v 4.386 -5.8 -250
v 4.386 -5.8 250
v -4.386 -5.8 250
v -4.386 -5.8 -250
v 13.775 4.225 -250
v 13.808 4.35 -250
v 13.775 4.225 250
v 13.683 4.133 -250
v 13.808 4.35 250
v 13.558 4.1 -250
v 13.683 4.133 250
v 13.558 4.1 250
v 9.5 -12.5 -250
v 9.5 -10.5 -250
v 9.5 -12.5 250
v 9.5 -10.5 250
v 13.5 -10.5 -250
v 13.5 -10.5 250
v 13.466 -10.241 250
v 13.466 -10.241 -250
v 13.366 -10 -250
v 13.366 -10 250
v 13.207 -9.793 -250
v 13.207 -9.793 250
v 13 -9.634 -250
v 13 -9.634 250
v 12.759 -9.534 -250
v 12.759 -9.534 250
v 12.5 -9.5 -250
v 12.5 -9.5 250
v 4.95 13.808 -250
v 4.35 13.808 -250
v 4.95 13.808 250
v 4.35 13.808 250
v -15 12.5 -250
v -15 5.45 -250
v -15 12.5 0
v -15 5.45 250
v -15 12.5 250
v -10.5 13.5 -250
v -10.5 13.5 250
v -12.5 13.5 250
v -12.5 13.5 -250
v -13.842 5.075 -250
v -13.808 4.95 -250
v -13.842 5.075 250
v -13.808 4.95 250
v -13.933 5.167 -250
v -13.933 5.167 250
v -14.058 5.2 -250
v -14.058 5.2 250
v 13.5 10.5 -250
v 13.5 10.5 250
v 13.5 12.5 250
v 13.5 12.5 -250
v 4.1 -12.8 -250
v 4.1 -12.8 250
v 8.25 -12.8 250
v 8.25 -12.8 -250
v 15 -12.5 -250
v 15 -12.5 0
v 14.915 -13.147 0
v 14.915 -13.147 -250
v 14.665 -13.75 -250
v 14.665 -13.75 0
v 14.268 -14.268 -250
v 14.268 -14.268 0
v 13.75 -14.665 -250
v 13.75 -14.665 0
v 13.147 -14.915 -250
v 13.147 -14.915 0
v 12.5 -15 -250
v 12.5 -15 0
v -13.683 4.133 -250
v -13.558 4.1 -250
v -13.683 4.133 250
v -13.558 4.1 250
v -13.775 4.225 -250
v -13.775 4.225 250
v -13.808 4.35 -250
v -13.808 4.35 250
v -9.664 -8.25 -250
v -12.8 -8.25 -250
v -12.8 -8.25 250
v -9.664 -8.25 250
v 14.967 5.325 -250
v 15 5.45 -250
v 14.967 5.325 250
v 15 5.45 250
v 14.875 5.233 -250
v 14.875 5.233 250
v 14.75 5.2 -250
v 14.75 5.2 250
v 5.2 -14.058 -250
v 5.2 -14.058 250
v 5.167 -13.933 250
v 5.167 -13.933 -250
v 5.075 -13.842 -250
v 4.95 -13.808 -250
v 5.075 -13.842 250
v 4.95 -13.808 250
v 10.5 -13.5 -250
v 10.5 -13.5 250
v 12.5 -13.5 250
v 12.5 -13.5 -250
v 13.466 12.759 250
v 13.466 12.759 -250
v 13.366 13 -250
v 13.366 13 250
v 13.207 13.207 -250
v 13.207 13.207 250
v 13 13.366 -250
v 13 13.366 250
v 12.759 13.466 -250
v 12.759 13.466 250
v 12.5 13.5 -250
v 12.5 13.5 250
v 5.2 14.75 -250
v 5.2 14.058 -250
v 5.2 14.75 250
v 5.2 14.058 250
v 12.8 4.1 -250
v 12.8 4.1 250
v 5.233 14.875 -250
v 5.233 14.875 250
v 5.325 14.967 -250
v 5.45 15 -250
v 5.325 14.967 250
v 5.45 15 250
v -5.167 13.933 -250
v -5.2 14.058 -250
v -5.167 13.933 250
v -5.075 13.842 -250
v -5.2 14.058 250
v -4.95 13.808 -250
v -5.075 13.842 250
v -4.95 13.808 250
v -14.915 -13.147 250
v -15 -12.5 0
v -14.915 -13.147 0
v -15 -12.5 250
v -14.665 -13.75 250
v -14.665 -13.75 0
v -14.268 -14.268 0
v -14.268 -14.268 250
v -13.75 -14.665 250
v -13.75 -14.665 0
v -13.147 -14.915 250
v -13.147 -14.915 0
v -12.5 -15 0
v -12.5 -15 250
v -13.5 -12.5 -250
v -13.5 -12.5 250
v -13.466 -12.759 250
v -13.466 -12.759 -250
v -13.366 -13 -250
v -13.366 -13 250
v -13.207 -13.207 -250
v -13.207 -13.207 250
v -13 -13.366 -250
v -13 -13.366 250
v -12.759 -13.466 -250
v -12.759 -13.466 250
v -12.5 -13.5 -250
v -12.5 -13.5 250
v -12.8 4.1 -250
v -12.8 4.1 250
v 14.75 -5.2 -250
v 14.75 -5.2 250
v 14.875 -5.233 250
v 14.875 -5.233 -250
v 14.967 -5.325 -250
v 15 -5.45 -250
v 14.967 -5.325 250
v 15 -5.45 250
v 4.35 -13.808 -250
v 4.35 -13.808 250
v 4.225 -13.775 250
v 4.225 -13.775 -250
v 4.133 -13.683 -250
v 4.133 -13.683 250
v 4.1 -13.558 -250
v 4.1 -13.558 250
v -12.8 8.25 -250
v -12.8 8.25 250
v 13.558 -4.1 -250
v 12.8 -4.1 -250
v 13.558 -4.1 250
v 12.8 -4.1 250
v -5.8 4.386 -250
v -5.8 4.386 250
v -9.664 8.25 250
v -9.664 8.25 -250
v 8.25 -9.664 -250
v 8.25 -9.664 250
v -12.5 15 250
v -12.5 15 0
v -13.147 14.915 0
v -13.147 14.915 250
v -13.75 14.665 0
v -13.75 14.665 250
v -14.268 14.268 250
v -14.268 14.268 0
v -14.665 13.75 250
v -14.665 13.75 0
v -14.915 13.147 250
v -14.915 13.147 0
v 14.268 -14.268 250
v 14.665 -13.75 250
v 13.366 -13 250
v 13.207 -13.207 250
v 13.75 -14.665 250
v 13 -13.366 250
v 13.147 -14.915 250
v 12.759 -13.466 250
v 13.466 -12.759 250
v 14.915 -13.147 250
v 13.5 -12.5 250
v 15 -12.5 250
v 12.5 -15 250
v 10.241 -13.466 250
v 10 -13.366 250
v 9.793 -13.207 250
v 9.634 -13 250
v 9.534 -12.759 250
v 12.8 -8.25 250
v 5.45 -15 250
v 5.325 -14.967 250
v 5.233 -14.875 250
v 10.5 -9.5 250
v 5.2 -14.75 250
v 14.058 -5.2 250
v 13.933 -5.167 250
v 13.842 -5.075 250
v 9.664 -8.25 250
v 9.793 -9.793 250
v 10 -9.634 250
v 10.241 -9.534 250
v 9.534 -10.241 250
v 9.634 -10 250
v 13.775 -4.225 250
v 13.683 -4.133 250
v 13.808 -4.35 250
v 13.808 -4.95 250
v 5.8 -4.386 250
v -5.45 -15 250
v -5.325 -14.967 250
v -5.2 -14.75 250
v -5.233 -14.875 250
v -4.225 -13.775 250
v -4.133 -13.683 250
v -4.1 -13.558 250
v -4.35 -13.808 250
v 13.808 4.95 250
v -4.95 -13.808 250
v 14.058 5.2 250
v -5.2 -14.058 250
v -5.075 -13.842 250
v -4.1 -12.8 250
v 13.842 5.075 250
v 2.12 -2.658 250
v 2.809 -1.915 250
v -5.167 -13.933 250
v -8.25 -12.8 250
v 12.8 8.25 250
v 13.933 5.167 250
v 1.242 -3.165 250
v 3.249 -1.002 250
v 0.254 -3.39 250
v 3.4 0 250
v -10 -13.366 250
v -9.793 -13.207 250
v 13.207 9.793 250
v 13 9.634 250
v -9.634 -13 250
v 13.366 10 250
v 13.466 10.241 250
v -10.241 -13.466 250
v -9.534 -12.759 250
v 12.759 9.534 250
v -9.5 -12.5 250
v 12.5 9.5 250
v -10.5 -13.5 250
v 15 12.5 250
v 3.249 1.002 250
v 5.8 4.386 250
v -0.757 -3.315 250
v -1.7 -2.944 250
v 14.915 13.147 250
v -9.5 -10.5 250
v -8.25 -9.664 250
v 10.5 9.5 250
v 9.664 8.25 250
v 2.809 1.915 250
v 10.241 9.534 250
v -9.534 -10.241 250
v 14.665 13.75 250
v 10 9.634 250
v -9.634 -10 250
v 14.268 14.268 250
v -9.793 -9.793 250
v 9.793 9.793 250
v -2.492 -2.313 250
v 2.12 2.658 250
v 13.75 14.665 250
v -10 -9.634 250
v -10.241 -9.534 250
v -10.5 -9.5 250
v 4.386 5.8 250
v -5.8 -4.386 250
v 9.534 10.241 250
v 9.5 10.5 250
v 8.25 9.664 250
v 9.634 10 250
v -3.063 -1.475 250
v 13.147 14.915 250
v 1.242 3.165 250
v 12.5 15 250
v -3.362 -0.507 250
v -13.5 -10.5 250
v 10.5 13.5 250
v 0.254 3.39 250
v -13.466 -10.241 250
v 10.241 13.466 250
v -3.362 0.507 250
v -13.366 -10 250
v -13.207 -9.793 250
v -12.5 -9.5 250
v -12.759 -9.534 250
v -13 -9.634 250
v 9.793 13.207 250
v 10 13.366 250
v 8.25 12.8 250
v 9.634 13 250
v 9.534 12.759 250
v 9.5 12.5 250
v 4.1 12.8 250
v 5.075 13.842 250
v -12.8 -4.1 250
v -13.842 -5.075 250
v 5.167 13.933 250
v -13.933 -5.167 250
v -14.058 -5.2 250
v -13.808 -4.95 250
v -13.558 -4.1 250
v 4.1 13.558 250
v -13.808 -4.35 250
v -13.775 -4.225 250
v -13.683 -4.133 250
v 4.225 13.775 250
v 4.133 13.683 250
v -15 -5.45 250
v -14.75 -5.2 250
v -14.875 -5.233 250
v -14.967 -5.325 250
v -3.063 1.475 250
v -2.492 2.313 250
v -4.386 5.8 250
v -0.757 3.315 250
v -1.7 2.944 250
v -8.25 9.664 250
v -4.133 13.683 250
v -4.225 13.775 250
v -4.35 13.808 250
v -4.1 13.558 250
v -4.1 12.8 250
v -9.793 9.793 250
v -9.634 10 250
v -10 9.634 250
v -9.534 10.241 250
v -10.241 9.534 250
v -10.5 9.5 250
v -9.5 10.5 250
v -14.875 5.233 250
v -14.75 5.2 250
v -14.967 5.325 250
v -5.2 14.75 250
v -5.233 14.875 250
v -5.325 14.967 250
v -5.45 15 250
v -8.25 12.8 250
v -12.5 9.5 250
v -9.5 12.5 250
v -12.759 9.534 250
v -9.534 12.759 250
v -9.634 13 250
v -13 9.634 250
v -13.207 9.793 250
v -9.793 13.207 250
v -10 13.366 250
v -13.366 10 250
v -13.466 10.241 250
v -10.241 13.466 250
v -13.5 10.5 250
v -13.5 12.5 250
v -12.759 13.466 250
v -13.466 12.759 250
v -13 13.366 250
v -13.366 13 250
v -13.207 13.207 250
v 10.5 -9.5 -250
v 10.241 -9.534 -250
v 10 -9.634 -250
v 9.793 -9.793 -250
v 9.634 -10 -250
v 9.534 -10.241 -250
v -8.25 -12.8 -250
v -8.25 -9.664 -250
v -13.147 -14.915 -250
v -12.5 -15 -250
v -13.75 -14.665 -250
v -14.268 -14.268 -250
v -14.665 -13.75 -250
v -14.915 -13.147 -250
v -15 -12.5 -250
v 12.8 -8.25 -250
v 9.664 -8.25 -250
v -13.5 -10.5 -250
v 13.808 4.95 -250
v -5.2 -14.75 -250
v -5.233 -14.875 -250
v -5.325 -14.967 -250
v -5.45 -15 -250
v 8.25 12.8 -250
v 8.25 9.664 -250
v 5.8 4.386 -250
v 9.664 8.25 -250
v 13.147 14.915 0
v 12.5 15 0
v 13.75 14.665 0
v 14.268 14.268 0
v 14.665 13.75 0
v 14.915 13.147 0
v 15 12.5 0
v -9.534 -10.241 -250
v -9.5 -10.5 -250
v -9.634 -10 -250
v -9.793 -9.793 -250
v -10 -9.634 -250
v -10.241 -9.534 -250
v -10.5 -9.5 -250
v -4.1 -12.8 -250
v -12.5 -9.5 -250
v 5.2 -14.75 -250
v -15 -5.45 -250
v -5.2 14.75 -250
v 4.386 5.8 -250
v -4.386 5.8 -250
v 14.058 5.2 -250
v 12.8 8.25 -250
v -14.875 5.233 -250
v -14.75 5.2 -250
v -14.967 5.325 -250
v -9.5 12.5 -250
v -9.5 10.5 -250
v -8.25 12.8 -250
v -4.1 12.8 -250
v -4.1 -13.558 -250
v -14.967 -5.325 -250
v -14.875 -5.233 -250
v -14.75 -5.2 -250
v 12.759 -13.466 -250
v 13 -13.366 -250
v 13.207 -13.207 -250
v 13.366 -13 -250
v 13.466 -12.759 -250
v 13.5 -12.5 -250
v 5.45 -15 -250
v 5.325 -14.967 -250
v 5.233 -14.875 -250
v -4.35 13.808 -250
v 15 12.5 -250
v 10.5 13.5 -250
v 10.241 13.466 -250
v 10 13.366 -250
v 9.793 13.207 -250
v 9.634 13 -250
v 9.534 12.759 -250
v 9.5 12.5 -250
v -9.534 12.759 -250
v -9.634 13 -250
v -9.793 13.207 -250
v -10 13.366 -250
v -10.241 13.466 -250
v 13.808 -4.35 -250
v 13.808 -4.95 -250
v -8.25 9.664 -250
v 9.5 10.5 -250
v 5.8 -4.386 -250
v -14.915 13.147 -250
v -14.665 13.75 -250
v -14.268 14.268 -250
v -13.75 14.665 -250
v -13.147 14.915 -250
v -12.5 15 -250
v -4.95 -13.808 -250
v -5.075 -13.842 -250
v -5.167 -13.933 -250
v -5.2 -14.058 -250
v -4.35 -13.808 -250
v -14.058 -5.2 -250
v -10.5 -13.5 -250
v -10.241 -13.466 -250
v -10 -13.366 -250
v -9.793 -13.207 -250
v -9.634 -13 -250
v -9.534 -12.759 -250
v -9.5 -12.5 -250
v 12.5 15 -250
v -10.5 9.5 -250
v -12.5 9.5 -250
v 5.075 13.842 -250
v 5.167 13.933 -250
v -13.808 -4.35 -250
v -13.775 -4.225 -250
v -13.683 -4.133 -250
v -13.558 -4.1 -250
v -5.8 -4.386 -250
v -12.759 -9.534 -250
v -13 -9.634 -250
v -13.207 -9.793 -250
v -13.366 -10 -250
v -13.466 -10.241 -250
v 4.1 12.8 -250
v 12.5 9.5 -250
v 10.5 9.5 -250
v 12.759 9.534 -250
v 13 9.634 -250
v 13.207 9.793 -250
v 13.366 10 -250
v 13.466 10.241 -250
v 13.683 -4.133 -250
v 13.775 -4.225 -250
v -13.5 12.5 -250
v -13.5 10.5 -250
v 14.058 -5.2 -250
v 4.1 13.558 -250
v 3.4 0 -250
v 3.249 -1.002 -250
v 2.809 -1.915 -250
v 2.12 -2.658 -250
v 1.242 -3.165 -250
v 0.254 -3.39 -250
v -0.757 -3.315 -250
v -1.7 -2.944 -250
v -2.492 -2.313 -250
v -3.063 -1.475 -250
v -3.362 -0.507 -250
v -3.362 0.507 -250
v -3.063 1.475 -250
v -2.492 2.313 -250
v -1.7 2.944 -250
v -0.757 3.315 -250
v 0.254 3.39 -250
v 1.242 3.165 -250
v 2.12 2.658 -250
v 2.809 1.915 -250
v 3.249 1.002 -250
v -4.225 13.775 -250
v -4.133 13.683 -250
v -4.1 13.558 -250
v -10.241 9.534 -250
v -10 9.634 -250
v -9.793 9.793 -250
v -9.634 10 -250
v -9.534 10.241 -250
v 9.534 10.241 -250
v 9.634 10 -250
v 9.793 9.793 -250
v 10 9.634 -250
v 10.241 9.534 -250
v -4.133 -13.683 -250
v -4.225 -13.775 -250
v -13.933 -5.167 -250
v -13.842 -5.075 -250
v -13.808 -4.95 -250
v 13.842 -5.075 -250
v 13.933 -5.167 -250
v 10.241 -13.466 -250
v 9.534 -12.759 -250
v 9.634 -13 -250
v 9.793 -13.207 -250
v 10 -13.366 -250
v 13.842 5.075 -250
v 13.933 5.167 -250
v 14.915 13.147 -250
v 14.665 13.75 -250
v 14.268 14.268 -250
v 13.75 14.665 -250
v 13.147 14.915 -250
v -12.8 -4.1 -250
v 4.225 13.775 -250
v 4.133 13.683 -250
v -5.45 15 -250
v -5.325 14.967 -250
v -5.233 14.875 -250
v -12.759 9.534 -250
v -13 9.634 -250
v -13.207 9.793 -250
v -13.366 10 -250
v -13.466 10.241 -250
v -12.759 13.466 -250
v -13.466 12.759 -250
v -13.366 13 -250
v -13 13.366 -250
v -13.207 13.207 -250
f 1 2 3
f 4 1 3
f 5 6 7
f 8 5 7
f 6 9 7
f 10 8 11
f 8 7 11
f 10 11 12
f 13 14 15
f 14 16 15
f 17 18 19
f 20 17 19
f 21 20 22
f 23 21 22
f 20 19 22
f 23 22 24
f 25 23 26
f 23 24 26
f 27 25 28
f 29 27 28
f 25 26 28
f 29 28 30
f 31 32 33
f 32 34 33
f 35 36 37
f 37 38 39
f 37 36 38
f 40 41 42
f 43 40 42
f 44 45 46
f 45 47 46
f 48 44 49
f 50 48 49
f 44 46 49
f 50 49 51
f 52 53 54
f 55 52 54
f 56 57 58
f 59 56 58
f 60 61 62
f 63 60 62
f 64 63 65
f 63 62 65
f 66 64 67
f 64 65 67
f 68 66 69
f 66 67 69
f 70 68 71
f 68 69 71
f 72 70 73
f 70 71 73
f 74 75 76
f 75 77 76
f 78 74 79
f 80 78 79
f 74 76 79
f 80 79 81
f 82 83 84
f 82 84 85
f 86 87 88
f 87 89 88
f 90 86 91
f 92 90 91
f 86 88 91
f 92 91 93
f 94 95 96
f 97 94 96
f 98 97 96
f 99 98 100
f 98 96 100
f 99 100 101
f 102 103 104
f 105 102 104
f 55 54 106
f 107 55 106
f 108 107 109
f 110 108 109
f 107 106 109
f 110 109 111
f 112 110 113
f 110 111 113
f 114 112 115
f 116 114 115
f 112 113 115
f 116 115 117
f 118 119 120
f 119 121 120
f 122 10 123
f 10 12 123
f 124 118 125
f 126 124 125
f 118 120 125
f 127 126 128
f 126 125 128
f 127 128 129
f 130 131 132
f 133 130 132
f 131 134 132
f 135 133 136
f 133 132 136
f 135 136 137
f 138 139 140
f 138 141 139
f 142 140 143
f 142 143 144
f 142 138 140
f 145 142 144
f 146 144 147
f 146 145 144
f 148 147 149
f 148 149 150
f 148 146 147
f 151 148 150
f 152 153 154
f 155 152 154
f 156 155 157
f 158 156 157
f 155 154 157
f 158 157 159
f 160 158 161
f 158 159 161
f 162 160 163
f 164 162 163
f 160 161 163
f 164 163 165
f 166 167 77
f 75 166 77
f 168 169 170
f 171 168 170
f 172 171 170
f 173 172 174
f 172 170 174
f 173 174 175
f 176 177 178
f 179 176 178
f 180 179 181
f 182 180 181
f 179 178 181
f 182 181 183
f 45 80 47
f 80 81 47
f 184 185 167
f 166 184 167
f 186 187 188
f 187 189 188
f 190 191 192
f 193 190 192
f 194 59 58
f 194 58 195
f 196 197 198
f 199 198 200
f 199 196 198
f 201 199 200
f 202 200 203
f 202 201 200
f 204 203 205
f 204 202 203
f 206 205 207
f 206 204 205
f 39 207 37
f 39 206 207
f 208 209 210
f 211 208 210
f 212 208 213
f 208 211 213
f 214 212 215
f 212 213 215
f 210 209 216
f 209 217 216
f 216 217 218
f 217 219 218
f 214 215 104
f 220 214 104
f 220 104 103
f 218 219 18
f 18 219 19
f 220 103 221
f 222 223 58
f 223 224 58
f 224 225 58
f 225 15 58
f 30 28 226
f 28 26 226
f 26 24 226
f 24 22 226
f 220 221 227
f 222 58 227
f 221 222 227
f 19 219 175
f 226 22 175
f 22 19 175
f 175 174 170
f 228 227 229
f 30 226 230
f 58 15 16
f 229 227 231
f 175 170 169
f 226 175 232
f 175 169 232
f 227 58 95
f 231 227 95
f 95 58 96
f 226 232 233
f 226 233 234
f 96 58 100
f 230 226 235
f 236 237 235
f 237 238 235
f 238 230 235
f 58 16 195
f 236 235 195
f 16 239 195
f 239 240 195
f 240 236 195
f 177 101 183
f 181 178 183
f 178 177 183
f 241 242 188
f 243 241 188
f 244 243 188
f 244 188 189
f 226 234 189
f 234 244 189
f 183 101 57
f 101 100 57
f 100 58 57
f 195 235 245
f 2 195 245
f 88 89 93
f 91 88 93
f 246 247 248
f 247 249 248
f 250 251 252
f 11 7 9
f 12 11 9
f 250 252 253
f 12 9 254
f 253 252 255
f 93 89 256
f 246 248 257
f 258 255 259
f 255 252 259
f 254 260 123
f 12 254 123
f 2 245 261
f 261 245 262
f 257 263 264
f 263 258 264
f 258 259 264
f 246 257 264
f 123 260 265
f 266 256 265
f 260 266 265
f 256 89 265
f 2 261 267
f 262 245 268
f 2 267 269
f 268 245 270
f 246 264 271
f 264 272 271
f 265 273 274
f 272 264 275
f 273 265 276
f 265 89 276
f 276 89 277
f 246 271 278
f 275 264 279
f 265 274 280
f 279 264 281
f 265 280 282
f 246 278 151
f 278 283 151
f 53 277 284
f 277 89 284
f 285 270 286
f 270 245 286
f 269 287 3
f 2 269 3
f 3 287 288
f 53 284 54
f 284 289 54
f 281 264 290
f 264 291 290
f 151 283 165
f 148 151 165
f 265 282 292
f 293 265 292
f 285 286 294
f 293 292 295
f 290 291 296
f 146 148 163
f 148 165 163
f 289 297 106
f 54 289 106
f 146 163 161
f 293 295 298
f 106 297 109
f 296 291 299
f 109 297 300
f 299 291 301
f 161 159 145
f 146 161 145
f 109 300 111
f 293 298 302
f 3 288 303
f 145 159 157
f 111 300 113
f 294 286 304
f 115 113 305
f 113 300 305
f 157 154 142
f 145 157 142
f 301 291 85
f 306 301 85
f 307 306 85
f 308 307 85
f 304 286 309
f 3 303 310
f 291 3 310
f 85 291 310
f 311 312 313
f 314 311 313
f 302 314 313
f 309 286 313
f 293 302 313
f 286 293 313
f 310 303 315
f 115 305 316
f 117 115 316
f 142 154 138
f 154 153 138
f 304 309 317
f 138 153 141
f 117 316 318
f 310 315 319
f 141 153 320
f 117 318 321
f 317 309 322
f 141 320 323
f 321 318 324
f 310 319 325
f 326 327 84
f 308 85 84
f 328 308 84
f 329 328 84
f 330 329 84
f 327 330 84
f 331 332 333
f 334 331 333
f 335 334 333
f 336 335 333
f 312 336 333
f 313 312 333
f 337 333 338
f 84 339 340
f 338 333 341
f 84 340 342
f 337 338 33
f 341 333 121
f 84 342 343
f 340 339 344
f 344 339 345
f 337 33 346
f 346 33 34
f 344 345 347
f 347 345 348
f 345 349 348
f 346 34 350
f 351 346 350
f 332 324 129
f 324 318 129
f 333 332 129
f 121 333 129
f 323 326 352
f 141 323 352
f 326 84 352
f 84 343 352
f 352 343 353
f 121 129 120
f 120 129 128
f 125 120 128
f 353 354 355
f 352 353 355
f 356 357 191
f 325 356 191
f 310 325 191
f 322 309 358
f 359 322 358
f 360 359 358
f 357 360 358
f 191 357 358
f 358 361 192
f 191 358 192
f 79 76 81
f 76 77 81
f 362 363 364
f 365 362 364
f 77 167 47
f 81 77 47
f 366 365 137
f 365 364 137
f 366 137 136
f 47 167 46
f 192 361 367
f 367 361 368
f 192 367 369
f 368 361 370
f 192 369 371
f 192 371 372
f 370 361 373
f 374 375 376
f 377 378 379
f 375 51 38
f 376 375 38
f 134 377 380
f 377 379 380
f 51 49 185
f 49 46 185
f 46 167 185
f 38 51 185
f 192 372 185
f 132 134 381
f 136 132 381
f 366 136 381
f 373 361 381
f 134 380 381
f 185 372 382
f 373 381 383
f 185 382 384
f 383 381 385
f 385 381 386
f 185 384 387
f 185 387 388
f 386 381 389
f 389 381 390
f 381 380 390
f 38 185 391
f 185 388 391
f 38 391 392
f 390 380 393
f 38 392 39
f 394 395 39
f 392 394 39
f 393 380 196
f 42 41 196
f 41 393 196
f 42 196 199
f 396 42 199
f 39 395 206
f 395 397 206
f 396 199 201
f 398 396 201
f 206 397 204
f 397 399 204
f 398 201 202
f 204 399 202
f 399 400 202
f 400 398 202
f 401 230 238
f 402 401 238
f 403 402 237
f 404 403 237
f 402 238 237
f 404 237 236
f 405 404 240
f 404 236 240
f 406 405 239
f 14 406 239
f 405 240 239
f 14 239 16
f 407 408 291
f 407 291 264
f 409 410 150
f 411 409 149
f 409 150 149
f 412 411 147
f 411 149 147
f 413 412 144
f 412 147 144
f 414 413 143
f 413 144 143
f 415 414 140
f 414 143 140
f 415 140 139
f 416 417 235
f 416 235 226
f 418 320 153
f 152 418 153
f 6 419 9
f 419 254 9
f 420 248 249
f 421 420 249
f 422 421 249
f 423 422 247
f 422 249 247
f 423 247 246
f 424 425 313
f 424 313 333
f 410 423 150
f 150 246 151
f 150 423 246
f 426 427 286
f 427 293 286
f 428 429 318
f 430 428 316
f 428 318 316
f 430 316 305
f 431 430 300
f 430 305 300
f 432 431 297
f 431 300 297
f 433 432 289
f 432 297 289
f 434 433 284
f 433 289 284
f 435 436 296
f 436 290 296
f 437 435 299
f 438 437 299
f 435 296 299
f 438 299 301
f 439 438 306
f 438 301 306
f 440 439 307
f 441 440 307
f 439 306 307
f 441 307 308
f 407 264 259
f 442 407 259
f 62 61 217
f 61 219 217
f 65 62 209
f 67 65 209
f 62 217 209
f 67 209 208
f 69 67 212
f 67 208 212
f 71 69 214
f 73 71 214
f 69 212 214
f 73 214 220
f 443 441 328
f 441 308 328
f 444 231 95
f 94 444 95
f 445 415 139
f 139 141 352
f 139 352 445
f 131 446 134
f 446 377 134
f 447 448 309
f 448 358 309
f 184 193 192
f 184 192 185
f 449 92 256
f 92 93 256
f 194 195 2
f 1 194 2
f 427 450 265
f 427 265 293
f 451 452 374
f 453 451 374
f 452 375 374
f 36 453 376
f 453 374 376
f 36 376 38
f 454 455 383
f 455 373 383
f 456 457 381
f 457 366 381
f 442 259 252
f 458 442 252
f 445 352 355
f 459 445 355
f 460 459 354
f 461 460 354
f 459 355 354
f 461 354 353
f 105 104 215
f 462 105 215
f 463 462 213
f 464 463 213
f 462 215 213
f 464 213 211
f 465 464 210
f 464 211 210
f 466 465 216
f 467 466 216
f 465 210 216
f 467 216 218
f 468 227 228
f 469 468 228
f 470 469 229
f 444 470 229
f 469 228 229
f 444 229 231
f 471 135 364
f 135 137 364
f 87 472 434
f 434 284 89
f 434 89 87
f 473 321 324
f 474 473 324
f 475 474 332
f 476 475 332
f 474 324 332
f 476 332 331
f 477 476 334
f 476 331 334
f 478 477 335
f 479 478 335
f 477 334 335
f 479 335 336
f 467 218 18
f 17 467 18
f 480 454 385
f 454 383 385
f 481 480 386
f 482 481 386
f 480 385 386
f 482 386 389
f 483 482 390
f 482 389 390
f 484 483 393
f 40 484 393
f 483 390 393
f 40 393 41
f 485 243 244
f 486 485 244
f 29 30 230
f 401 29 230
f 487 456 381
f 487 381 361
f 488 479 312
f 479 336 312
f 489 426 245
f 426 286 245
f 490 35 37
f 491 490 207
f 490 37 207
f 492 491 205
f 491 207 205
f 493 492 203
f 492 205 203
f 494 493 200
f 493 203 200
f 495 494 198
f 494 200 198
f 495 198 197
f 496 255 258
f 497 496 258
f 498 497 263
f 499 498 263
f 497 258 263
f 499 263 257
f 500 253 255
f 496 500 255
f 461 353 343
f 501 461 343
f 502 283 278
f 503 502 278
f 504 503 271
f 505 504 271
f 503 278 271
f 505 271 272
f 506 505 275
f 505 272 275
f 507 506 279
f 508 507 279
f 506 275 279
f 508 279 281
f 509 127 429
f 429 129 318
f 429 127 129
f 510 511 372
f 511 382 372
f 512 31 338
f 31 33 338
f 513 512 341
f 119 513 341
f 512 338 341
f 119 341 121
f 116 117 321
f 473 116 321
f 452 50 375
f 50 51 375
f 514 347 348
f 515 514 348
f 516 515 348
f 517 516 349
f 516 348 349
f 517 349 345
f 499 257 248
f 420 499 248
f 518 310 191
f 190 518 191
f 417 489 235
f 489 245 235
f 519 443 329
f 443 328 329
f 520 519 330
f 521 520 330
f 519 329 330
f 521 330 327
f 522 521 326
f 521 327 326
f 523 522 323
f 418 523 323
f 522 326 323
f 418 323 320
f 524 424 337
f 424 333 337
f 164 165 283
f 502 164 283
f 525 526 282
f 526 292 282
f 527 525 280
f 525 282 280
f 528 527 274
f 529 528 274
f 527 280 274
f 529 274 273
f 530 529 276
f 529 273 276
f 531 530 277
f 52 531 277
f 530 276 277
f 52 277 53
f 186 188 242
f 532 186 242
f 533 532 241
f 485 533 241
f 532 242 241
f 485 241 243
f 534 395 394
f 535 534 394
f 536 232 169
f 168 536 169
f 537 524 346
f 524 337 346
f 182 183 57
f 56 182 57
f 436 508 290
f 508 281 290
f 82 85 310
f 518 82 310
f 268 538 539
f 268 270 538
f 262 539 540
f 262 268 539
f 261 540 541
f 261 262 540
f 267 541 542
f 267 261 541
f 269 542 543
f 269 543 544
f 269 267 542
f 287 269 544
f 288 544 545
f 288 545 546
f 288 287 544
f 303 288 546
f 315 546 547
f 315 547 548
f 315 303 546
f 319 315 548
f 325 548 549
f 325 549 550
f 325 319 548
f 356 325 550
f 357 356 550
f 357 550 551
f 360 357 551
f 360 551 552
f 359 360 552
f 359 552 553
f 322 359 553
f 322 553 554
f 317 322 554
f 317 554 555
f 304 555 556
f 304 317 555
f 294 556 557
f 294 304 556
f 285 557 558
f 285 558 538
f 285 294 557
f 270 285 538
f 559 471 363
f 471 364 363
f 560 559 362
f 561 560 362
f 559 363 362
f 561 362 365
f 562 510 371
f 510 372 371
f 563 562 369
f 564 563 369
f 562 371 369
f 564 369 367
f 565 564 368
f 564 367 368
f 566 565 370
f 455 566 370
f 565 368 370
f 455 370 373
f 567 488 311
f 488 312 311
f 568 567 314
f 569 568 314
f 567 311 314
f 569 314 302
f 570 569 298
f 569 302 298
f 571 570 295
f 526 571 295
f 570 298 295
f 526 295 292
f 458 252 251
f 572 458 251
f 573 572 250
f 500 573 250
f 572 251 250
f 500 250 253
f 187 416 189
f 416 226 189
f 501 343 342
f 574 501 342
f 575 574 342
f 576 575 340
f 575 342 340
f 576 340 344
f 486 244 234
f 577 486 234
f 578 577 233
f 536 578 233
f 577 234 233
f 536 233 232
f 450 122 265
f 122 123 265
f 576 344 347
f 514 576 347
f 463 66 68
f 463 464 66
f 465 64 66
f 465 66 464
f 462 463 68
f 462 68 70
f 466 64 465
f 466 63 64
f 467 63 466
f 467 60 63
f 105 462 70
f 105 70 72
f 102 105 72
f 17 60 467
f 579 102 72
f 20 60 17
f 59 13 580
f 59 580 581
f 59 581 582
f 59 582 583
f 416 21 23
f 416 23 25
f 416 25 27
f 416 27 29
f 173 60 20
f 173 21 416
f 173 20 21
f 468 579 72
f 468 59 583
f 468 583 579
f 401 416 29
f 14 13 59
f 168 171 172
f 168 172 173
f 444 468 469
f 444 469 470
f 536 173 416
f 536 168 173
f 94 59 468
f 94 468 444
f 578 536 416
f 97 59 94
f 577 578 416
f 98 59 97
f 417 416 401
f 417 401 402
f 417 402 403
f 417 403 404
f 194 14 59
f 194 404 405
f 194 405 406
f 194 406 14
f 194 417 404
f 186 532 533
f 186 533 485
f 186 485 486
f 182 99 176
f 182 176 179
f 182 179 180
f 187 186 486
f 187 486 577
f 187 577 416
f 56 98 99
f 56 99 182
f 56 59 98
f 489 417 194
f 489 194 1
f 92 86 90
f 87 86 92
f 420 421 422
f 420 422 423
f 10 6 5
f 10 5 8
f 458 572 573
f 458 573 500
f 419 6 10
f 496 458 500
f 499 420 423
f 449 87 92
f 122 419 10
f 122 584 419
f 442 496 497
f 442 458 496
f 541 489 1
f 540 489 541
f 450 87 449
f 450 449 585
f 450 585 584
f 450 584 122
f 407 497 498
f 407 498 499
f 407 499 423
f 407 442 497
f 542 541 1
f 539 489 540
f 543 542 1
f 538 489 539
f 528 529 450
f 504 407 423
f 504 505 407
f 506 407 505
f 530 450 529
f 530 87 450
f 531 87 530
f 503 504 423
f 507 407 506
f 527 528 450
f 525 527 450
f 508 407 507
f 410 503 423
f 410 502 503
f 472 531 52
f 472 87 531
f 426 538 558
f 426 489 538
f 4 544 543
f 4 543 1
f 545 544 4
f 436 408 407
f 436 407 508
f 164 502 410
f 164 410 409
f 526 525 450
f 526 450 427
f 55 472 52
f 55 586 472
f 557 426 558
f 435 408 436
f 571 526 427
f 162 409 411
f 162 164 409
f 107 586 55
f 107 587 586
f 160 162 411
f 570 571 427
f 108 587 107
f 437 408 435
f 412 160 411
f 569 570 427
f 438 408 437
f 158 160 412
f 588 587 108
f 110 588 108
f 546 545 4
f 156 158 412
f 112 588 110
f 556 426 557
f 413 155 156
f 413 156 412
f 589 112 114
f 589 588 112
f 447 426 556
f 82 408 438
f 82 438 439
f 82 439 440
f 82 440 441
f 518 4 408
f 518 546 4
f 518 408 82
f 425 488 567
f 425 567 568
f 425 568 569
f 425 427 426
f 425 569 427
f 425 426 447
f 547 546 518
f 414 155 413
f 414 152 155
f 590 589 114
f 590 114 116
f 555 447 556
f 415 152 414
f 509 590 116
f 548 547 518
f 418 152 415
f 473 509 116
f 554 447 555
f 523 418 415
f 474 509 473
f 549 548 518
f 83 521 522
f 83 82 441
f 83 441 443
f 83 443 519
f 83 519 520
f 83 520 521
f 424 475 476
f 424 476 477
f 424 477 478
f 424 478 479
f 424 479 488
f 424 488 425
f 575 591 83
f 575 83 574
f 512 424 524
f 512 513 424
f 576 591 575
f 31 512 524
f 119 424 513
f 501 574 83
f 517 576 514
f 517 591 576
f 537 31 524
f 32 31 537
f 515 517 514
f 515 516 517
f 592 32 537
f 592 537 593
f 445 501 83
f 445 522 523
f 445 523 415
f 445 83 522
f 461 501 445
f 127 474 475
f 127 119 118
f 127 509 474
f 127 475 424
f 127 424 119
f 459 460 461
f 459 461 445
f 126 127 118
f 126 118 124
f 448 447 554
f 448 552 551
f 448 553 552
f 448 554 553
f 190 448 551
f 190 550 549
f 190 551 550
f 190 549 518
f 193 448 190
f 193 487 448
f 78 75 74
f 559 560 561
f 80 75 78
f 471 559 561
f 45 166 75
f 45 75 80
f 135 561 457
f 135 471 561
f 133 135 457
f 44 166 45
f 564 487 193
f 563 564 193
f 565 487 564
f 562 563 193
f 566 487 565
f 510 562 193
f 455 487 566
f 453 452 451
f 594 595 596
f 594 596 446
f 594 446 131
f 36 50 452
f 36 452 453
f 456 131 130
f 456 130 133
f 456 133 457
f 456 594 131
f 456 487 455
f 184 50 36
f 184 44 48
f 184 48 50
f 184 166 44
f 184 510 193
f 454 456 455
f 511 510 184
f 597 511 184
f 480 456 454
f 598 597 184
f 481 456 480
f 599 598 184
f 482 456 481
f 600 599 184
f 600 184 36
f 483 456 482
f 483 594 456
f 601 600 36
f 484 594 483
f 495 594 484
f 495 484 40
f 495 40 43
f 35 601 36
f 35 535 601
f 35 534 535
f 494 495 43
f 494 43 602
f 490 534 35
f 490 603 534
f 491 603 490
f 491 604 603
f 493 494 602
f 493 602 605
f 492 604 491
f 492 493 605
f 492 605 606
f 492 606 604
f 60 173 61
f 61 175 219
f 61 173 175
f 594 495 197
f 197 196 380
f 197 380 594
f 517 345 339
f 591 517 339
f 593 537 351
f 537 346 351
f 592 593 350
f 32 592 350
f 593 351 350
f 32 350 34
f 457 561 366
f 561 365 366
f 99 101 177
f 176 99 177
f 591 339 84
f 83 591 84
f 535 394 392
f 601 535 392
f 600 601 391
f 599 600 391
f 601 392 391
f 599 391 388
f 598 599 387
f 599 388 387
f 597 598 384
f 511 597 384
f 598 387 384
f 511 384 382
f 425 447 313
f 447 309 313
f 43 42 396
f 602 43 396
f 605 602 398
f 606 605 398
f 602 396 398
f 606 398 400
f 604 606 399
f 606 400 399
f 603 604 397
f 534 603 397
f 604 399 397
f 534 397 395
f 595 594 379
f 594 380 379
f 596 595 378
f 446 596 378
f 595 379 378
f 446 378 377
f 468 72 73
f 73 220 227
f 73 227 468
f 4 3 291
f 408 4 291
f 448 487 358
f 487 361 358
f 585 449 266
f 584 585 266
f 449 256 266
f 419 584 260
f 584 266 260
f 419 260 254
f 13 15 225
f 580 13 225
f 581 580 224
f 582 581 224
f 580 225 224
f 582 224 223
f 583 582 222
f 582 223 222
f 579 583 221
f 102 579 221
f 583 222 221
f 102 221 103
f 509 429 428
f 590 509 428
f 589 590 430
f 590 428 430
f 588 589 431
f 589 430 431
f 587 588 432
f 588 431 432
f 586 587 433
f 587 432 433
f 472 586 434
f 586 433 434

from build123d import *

# Parameters (mm, degrees)
BOSS_EXTRUDE1_DEPTH = 250
SKETCH2_R           = 3.4
CUT_EXTRUDE1_DEPTH  = 251.898385806
FILLET1_R           = 2.5
FILLET2_R           = 0.25
SKETCH3_R           = 3.4
BOSS_EXTRUDE3_DEPTH = 250


with BuildPart() as part:
    # Sketch1 → Boss-Extrude1 (new body)
    with BuildSketch(Plane.XY):
        Polygon((-15, 15), (-5.2, 15), (-5.2, 13.808325472), (-4.1, 13.808325472), (-4.1, 12.8), (-8.25, 12.8), (-8.25, 9.664213562), (-4.385786438, 5.8), (4.385786438, 5.8), (8.25, 9.664213562), (8.25, 12.8), (4.1, 12.8), (4.1, 13.808325472), (5.2, 13.808325472), (5.2, 15), (15, 15), (15, 5.2), (13.808325472, 5.2), (13.808325472, 4.1), (12.8, 4.1), (12.8, 8.25), (9.664213562, 8.25), (5.8, 4.385786438), (5.8, -4.385786438), (9.664213562, -8.25), (12.8, -8.25), (12.8, -4.1), (13.808325472, -4.1), (13.808325472, -5.2), (15, -5.2), (15, -15), (5.2, -15), (5.2, -13.808325472), (4.1, -13.808325472), (4.1, -12.8), (8.25, -12.8), (8.25, -9.664213562), (4.385786438, -5.8), (-4.385786438, -5.8), (-8.25, -9.664213562), (-8.25, -12.8), (-4.1, -12.8), (-4.1, -13.808325472), (-5.2, -13.808325472), (-5.2, -15), (-15, -15), (-15, -5.2), (-13.808325472, -5.2), (-13.808325472, -4.1), (-12.8, -4.1), (-12.8, -8.25), (-9.664213562, -8.25), (-5.8, -4.385786438), (-5.8, 4.385786438), (-9.664213562, 8.25), (-12.8, 8.25), (-12.8, 4.1), (-13.808325472, 4.1), (-13.808325472, 5.2), (-15, 5.2), align=None)
    extrude(amount=BOSS_EXTRUDE1_DEPTH)

    # Sketch2 → Cut-Extrude1 (cut, through all)
    with BuildSketch(Plane.XY.offset(250)):
        Circle(SKETCH2_R)
        with BuildLine():
            Line((-12.5, 13.5), (-10.5, 13.5))
            ThreePointArc((-10.5, 13.5), (-9.792893219, 13.207106781), (-9.5, 12.5))
            Line((-9.5, 12.5), (-9.5, 10.5))
            ThreePointArc((-9.5, 10.5), (-9.792893219, 9.792893219), (-10.5, 9.5))
            Line((-10.5, 9.5), (-12.5, 9.5))
            ThreePointArc((-12.5, 9.5), (-13.207106781, 9.792893219), (-13.5, 10.5))
            Line((-13.5, 10.5), (-13.5, 12.5))
            ThreePointArc((-13.5, 12.5), (-13.207106781, 13.207106781), (-12.5, 13.5))
        make_face()
        with BuildLine():
            Line((9.5, 12.5), (9.5, 10.5))
            ThreePointArc((9.5, 10.5), (9.792893219, 9.792893219), (10.5, 9.5))
            Line((10.5, 9.5), (12.5, 9.5))
            ThreePointArc((12.5, 9.5), (13.207106781, 9.792893219), (13.5, 10.5))
            Line((13.5, 10.5), (13.5, 12.5))
            ThreePointArc((13.5, 12.5), (13.207106781, 13.207106781), (12.5, 13.5))
            Line((12.5, 13.5), (10.5, 13.5))
            ThreePointArc((10.5, 13.5), (9.792893219, 13.207106781), (9.5, 12.5))
        make_face()
        with BuildLine():
            Line((12.5, -13.5), (10.5, -13.5))
            ThreePointArc((10.5, -13.5), (9.792893219, -13.207106781), (9.5, -12.5))
            Line((9.5, -12.5), (9.5, -10.5))
            ThreePointArc((9.5, -10.5), (9.792893219, -9.792893219), (10.5, -9.5))
            Line((10.5, -9.5), (12.5, -9.5))
            ThreePointArc((12.5, -9.5), (13.207106781, -9.792893219), (13.5, -10.5))
            Line((13.5, -10.5), (13.5, -12.5))
            ThreePointArc((13.5, -12.5), (13.207106781, -13.207106781), (12.5, -13.5))
        make_face()
        with BuildLine():
            Line((-9.5, -12.5), (-9.5, -10.5))
            ThreePointArc((-9.5, -10.5), (-9.792893219, -9.792893219), (-10.5, -9.5))
            Line((-10.5, -9.5), (-12.5, -9.5))
            ThreePointArc((-12.5, -9.5), (-13.207106781, -9.792893219), (-13.5, -10.5))
            Line((-13.5, -10.5), (-13.5, -12.5))
            ThreePointArc((-13.5, -12.5), (-13.207106781, -13.207106781), (-12.5, -13.5))
            Line((-12.5, -13.5), (-10.5, -13.5))
            ThreePointArc((-10.5, -13.5), (-9.792893219, -13.207106781), (-9.5, -12.5))
        make_face()
    extrude(amount=-CUT_EXTRUDE1_DEPTH, mode=Mode.SUBTRACT)

    # Fillet1
    fillet1_edges = [part.edges().sort_by_distance(p)[0] for p in [
        (15, -15, 125),
        (-15, -15, 125),
        (-15, 15, 125),
        (15, 15, 125),
    ]]
    fillet(fillet1_edges, radius=FILLET1_R)

    # Fillet2
    fillet2_edges = [part.edges().sort_by_distance(p)[0] for p in [
        (5.2, -15, 125),
        (5.2, -13.808325472, 125),
        (4.1, -13.808325472, 125),
        (-4.1, -13.808325472, 125),
        (-5.2, -13.808325472, 125),
        (-5.2, -15, 125),
        (-15, -5.2, 125),
        (-13.808325472, -5.2, 125),
        (-13.808325472, -4.1, 125),
        (-13.808325472, 4.1, 125),
        (-13.808325472, 5.2, 125),
        (-15, 5.2, 125),
        (-5.2, 15, 125),
        (-5.2, 13.808325472, 125),
        (-4.1, 13.808325472, 125),
        (4.1, 13.808325472, 125),
        (5.2, 13.808325472, 125),
        (5.2, 15, 125),
        (15, 5.2, 125),
        (13.808325472, 5.2, 125),
        (13.808325472, 4.1, 125),
        (13.808325472, -4.1, 125),
        (13.808325472, -5.2, 125),
        (15, -5.2, 125),
    ]]
    fillet(fillet2_edges, radius=FILLET2_R)

    # Sketch3 → Boss-Extrude3 (add)
    with BuildSketch(Plane(origin=(0, 0, 0), x_dir=(-1, 0, 0), z_dir=(0, 0, -1))):
        with BuildLine():
            Line((12.8, 4.1), (13.558325472, 4.1))
            ThreePointArc((13.558325472, 4.1), (13.735102167, 4.173223305), (13.808325472, 4.35))
            Line((13.808325472, 4.35), (13.808325472, 4.95))
            ThreePointArc((13.808325472, 4.95), (13.881548777, 5.126776695), (14.058325472, 5.2))
            Line((14.058325472, 5.2), (14.75, 5.2))
            ThreePointArc((14.75, 5.2), (14.926776695, 5.273223305), (15, 5.45))
            Line((15, 5.45), (15, 12.5))
            ThreePointArc((15, 12.5), (14.267766953, 14.267766953), (12.5, 15))
            Line((12.5, 15), (5.45, 15))
            ThreePointArc((5.45, 15), (5.273223305, 14.926776695), (5.2, 14.75))
            Line((5.2, 14.75), (5.2, 14.058325472))
            ThreePointArc((5.2, 14.058325472), (5.126776695, 13.881548777), (4.95, 13.808325472))
            Line((4.95, 13.808325472), (4.35, 13.808325472))
            ThreePointArc((4.35, 13.808325472), (4.173223305, 13.735102167), (4.1, 13.558325472))
            Line((4.1, 13.558325472), (4.1, 12.8))
            Line((4.1, 12.8), (8.25, 12.8))
            Line((8.25, 12.8), (8.25, 9.664213562))
            Line((8.25, 9.664213562), (4.385786438, 5.8))
            Line((4.385786438, 5.8), (-4.385786438, 5.8))
            Line((-4.385786438, 5.8), (-8.25, 9.664213562))
            Line((-8.25, 9.664213562), (-8.25, 12.8))
            Line((-8.25, 12.8), (-4.1, 12.8))
            Line((-4.1, 12.8), (-4.1, 13.558325472))
            ThreePointArc((-4.1, 13.558325472), (-4.173223305, 13.735102167), (-4.35, 13.808325472))
            Line((-4.35, 13.808325472), (-4.95, 13.808325472))
            ThreePointArc((-4.95, 13.808325472), (-5.126776695, 13.881548777), (-5.2, 14.058325472))
            Line((-5.2, 14.058325472), (-5.2, 14.75))
            ThreePointArc((-5.2, 14.75), (-5.273223305, 14.926776695), (-5.45, 15))
            Line((-5.45, 15), (-12.5, 15))
            ThreePointArc((-12.5, 15), (-14.267766953, 14.267766953), (-15, 12.5))
            Line((-15, 12.5), (-15, 5.45))
            ThreePointArc((-15, 5.45), (-14.926776695, 5.273223305), (-14.75, 5.2))
            Line((-14.75, 5.2), (-14.058325472, 5.2))
            ThreePointArc((-14.058325472, 5.2), (-13.881548777, 5.126776695), (-13.808325472, 4.95))
            Line((-13.808325472, 4.95), (-13.808325472, 4.35))
            ThreePointArc((-13.808325472, 4.35), (-13.735102167, 4.173223305), (-13.558325472, 4.1))
            Line((-13.558325472, 4.1), (-12.8, 4.1))
            Line((-12.8, 4.1), (-12.8, 8.25))
            Line((-12.8, 8.25), (-9.664213562, 8.25))
            Line((-9.664213562, 8.25), (-5.8, 4.385786438))
            Line((-5.8, 4.385786438), (-5.8, -4.385786438))
            Line((-5.8, -4.385786438), (-9.664213562, -8.25))
            Line((-9.664213562, -8.25), (-12.8, -8.25))
            Line((-12.8, -8.25), (-12.8, -4.1))
            Line((-12.8, -4.1), (-13.558325472, -4.1))
            ThreePointArc((-13.558325472, -4.1), (-13.735102167, -4.173223305), (-13.808325472, -4.35))
            Line((-13.808325472, -4.35), (-13.808325472, -4.95))
            ThreePointArc((-13.808325472, -4.95), (-13.881548777, -5.126776695), (-14.058325472, -5.2))
            Line((-14.058325472, -5.2), (-14.75, -5.2))
            ThreePointArc((-14.75, -5.2), (-14.926776695, -5.273223305), (-15, -5.45))
            Line((-15, -5.45), (-15, -12.5))
            ThreePointArc((-15, -12.5), (-14.267766953, -14.267766953), (-12.5, -15))
            Line((-12.5, -15), (-5.45, -15))
            ThreePointArc((-5.45, -15), (-5.273223305, -14.926776695), (-5.2, -14.75))
            Line((-5.2, -14.75), (-5.2, -14.058325472))
            ThreePointArc((-5.2, -14.058325472), (-5.126776695, -13.881548777), (-4.95, -13.808325472))
            Line((-4.95, -13.808325472), (-4.35, -13.808325472))
            ThreePointArc((-4.35, -13.808325472), (-4.173223305, -13.735102167), (-4.1, -13.558325472))
            Line((-4.1, -13.558325472), (-4.1, -12.8))
            Line((-4.1, -12.8), (-8.25, -12.8))
            Line((-8.25, -12.8), (-8.25, -9.664213562))
            Line((-8.25, -9.664213562), (-4.385786438, -5.8))
            Line((-4.385786438, -5.8), (4.385786438, -5.8))
            Line((4.385786438, -5.8), (8.25, -9.664213562))
            Line((8.25, -9.664213562), (8.25, -12.8))
            Line((8.25, -12.8), (4.1, -12.8))
            Line((4.1, -12.8), (4.1, -13.558325472))
            ThreePointArc((4.1, -13.558325472), (4.173223305, -13.735102167), (4.35, -13.808325472))
            Line((4.35, -13.808325472), (4.95, -13.808325472))
            ThreePointArc((4.95, -13.808325472), (5.126776695, -13.881548777), (5.2, -14.058325472))
            Line((5.2, -14.058325472), (5.2, -14.75))
            ThreePointArc((5.2, -14.75), (5.273223305, -14.926776695), (5.45, -15))
            Line((5.45, -15), (12.5, -15))
            ThreePointArc((12.5, -15), (14.267766953, -14.267766953), (15, -12.5))
            Line((15, -12.5), (15, -5.45))
            ThreePointArc((15, -5.45), (14.926776695, -5.273223305), (14.75, -5.2))
            Line((14.75, -5.2), (14.058325472, -5.2))
            ThreePointArc((14.058325472, -5.2), (13.881548777, -5.126776695), (13.808325472, -4.95))
            Line((13.808325472, -4.95), (13.808325472, -4.35))
            ThreePointArc((13.808325472, -4.35), (13.735102167, -4.173223305), (13.558325472, -4.1))
            Line((13.558325472, -4.1), (12.8, -4.1))
            Line((12.8, -4.1), (12.8, -8.25))
            Line((12.8, -8.25), (9.664213562, -8.25))
            Line((9.664213562, -8.25), (5.8, -4.385786438))
            Line((5.8, -4.385786438), (5.8, 4.385786438))
            Line((5.8, 4.385786438), (9.664213562, 8.25))
            Line((9.664213562, 8.25), (12.8, 8.25))
            Line((12.8, 8.25), (12.8, 4.1))
        make_face()
        with Locations(Location((0, 0, 0), (0, 0, 180))):
            Circle(SKETCH3_R, mode=Mode.SUBTRACT)
        with BuildLine():
            Line((-9.5, 12.5), (-9.5, 10.5))
            ThreePointArc((-9.5, 10.5), (-9.792893219, 9.792893219), (-10.5, 9.5))
            Line((-10.5, 9.5), (-12.5, 9.5))
            ThreePointArc((-12.5, 9.5), (-13.207106781, 9.792893219), (-13.5, 10.5))
            Line((-13.5, 10.5), (-13.5, 12.5))
            ThreePointArc((-13.5, 12.5), (-13.207106781, 13.207106781), (-12.5, 13.5))
            Line((-12.5, 13.5), (-10.5, 13.5))
            ThreePointArc((-10.5, 13.5), (-9.792893219, 13.207106781), (-9.5, 12.5))
        make_face(mode=Mode.SUBTRACT)
        with BuildLine():
            Line((12.5, 9.5), (10.5, 9.5))
            ThreePointArc((10.5, 9.5), (9.792893219, 9.792893219), (9.5, 10.5))
            Line((9.5, 10.5), (9.5, 12.5))
            ThreePointArc((9.5, 12.5), (9.792893219, 13.207106781), (10.5, 13.5))
            Line((10.5, 13.5), (12.5, 13.5))
            ThreePointArc((12.5, 13.5), (13.207106781, 13.207106781), (13.5, 12.5))
            Line((13.5, 12.5), (13.5, 10.5))
            ThreePointArc((13.5, 10.5), (13.207106781, 9.792893219), (12.5, 9.5))
        make_face(mode=Mode.SUBTRACT)
        with BuildLine():
            Line((9.5, -12.5), (9.5, -10.5))
            ThreePointArc((9.5, -10.5), (9.792893219, -9.792893219), (10.5, -9.5))
            Line((10.5, -9.5), (12.5, -9.5))
            ThreePointArc((12.5, -9.5), (13.207106781, -9.792893219), (13.5, -10.5))
            Line((13.5, -10.5), (13.5, -12.5))
            ThreePointArc((13.5, -12.5), (13.207106781, -13.207106781), (12.5, -13.5))
            Line((12.5, -13.5), (10.5, -13.5))
            ThreePointArc((10.5, -13.5), (9.792893219, -13.207106781), (9.5, -12.5))
        make_face(mode=Mode.SUBTRACT)
        with BuildLine():
            Line((-9.5, -10.5), (-9.5, -12.5))
            ThreePointArc((-9.5, -12.5), (-9.792893219, -13.207106781), (-10.5, -13.5))
            Line((-10.5, -13.5), (-12.5, -13.5))
            ThreePointArc((-12.5, -13.5), (-13.207106781, -13.207106781), (-13.5, -12.5))
            Line((-13.5, -12.5), (-13.5, -10.5))
            ThreePointArc((-13.5, -10.5), (-13.207106781, -9.792893219), (-12.5, -9.5))
            Line((-12.5, -9.5), (-10.5, -9.5))
            ThreePointArc((-10.5, -9.5), (-9.792893219, -9.792893219), (-9.5, -10.5))
        make_face(mode=Mode.SUBTRACT)
    extrude(amount=BOSS_EXTRUDE3_DEPTH)


solid = part.part
